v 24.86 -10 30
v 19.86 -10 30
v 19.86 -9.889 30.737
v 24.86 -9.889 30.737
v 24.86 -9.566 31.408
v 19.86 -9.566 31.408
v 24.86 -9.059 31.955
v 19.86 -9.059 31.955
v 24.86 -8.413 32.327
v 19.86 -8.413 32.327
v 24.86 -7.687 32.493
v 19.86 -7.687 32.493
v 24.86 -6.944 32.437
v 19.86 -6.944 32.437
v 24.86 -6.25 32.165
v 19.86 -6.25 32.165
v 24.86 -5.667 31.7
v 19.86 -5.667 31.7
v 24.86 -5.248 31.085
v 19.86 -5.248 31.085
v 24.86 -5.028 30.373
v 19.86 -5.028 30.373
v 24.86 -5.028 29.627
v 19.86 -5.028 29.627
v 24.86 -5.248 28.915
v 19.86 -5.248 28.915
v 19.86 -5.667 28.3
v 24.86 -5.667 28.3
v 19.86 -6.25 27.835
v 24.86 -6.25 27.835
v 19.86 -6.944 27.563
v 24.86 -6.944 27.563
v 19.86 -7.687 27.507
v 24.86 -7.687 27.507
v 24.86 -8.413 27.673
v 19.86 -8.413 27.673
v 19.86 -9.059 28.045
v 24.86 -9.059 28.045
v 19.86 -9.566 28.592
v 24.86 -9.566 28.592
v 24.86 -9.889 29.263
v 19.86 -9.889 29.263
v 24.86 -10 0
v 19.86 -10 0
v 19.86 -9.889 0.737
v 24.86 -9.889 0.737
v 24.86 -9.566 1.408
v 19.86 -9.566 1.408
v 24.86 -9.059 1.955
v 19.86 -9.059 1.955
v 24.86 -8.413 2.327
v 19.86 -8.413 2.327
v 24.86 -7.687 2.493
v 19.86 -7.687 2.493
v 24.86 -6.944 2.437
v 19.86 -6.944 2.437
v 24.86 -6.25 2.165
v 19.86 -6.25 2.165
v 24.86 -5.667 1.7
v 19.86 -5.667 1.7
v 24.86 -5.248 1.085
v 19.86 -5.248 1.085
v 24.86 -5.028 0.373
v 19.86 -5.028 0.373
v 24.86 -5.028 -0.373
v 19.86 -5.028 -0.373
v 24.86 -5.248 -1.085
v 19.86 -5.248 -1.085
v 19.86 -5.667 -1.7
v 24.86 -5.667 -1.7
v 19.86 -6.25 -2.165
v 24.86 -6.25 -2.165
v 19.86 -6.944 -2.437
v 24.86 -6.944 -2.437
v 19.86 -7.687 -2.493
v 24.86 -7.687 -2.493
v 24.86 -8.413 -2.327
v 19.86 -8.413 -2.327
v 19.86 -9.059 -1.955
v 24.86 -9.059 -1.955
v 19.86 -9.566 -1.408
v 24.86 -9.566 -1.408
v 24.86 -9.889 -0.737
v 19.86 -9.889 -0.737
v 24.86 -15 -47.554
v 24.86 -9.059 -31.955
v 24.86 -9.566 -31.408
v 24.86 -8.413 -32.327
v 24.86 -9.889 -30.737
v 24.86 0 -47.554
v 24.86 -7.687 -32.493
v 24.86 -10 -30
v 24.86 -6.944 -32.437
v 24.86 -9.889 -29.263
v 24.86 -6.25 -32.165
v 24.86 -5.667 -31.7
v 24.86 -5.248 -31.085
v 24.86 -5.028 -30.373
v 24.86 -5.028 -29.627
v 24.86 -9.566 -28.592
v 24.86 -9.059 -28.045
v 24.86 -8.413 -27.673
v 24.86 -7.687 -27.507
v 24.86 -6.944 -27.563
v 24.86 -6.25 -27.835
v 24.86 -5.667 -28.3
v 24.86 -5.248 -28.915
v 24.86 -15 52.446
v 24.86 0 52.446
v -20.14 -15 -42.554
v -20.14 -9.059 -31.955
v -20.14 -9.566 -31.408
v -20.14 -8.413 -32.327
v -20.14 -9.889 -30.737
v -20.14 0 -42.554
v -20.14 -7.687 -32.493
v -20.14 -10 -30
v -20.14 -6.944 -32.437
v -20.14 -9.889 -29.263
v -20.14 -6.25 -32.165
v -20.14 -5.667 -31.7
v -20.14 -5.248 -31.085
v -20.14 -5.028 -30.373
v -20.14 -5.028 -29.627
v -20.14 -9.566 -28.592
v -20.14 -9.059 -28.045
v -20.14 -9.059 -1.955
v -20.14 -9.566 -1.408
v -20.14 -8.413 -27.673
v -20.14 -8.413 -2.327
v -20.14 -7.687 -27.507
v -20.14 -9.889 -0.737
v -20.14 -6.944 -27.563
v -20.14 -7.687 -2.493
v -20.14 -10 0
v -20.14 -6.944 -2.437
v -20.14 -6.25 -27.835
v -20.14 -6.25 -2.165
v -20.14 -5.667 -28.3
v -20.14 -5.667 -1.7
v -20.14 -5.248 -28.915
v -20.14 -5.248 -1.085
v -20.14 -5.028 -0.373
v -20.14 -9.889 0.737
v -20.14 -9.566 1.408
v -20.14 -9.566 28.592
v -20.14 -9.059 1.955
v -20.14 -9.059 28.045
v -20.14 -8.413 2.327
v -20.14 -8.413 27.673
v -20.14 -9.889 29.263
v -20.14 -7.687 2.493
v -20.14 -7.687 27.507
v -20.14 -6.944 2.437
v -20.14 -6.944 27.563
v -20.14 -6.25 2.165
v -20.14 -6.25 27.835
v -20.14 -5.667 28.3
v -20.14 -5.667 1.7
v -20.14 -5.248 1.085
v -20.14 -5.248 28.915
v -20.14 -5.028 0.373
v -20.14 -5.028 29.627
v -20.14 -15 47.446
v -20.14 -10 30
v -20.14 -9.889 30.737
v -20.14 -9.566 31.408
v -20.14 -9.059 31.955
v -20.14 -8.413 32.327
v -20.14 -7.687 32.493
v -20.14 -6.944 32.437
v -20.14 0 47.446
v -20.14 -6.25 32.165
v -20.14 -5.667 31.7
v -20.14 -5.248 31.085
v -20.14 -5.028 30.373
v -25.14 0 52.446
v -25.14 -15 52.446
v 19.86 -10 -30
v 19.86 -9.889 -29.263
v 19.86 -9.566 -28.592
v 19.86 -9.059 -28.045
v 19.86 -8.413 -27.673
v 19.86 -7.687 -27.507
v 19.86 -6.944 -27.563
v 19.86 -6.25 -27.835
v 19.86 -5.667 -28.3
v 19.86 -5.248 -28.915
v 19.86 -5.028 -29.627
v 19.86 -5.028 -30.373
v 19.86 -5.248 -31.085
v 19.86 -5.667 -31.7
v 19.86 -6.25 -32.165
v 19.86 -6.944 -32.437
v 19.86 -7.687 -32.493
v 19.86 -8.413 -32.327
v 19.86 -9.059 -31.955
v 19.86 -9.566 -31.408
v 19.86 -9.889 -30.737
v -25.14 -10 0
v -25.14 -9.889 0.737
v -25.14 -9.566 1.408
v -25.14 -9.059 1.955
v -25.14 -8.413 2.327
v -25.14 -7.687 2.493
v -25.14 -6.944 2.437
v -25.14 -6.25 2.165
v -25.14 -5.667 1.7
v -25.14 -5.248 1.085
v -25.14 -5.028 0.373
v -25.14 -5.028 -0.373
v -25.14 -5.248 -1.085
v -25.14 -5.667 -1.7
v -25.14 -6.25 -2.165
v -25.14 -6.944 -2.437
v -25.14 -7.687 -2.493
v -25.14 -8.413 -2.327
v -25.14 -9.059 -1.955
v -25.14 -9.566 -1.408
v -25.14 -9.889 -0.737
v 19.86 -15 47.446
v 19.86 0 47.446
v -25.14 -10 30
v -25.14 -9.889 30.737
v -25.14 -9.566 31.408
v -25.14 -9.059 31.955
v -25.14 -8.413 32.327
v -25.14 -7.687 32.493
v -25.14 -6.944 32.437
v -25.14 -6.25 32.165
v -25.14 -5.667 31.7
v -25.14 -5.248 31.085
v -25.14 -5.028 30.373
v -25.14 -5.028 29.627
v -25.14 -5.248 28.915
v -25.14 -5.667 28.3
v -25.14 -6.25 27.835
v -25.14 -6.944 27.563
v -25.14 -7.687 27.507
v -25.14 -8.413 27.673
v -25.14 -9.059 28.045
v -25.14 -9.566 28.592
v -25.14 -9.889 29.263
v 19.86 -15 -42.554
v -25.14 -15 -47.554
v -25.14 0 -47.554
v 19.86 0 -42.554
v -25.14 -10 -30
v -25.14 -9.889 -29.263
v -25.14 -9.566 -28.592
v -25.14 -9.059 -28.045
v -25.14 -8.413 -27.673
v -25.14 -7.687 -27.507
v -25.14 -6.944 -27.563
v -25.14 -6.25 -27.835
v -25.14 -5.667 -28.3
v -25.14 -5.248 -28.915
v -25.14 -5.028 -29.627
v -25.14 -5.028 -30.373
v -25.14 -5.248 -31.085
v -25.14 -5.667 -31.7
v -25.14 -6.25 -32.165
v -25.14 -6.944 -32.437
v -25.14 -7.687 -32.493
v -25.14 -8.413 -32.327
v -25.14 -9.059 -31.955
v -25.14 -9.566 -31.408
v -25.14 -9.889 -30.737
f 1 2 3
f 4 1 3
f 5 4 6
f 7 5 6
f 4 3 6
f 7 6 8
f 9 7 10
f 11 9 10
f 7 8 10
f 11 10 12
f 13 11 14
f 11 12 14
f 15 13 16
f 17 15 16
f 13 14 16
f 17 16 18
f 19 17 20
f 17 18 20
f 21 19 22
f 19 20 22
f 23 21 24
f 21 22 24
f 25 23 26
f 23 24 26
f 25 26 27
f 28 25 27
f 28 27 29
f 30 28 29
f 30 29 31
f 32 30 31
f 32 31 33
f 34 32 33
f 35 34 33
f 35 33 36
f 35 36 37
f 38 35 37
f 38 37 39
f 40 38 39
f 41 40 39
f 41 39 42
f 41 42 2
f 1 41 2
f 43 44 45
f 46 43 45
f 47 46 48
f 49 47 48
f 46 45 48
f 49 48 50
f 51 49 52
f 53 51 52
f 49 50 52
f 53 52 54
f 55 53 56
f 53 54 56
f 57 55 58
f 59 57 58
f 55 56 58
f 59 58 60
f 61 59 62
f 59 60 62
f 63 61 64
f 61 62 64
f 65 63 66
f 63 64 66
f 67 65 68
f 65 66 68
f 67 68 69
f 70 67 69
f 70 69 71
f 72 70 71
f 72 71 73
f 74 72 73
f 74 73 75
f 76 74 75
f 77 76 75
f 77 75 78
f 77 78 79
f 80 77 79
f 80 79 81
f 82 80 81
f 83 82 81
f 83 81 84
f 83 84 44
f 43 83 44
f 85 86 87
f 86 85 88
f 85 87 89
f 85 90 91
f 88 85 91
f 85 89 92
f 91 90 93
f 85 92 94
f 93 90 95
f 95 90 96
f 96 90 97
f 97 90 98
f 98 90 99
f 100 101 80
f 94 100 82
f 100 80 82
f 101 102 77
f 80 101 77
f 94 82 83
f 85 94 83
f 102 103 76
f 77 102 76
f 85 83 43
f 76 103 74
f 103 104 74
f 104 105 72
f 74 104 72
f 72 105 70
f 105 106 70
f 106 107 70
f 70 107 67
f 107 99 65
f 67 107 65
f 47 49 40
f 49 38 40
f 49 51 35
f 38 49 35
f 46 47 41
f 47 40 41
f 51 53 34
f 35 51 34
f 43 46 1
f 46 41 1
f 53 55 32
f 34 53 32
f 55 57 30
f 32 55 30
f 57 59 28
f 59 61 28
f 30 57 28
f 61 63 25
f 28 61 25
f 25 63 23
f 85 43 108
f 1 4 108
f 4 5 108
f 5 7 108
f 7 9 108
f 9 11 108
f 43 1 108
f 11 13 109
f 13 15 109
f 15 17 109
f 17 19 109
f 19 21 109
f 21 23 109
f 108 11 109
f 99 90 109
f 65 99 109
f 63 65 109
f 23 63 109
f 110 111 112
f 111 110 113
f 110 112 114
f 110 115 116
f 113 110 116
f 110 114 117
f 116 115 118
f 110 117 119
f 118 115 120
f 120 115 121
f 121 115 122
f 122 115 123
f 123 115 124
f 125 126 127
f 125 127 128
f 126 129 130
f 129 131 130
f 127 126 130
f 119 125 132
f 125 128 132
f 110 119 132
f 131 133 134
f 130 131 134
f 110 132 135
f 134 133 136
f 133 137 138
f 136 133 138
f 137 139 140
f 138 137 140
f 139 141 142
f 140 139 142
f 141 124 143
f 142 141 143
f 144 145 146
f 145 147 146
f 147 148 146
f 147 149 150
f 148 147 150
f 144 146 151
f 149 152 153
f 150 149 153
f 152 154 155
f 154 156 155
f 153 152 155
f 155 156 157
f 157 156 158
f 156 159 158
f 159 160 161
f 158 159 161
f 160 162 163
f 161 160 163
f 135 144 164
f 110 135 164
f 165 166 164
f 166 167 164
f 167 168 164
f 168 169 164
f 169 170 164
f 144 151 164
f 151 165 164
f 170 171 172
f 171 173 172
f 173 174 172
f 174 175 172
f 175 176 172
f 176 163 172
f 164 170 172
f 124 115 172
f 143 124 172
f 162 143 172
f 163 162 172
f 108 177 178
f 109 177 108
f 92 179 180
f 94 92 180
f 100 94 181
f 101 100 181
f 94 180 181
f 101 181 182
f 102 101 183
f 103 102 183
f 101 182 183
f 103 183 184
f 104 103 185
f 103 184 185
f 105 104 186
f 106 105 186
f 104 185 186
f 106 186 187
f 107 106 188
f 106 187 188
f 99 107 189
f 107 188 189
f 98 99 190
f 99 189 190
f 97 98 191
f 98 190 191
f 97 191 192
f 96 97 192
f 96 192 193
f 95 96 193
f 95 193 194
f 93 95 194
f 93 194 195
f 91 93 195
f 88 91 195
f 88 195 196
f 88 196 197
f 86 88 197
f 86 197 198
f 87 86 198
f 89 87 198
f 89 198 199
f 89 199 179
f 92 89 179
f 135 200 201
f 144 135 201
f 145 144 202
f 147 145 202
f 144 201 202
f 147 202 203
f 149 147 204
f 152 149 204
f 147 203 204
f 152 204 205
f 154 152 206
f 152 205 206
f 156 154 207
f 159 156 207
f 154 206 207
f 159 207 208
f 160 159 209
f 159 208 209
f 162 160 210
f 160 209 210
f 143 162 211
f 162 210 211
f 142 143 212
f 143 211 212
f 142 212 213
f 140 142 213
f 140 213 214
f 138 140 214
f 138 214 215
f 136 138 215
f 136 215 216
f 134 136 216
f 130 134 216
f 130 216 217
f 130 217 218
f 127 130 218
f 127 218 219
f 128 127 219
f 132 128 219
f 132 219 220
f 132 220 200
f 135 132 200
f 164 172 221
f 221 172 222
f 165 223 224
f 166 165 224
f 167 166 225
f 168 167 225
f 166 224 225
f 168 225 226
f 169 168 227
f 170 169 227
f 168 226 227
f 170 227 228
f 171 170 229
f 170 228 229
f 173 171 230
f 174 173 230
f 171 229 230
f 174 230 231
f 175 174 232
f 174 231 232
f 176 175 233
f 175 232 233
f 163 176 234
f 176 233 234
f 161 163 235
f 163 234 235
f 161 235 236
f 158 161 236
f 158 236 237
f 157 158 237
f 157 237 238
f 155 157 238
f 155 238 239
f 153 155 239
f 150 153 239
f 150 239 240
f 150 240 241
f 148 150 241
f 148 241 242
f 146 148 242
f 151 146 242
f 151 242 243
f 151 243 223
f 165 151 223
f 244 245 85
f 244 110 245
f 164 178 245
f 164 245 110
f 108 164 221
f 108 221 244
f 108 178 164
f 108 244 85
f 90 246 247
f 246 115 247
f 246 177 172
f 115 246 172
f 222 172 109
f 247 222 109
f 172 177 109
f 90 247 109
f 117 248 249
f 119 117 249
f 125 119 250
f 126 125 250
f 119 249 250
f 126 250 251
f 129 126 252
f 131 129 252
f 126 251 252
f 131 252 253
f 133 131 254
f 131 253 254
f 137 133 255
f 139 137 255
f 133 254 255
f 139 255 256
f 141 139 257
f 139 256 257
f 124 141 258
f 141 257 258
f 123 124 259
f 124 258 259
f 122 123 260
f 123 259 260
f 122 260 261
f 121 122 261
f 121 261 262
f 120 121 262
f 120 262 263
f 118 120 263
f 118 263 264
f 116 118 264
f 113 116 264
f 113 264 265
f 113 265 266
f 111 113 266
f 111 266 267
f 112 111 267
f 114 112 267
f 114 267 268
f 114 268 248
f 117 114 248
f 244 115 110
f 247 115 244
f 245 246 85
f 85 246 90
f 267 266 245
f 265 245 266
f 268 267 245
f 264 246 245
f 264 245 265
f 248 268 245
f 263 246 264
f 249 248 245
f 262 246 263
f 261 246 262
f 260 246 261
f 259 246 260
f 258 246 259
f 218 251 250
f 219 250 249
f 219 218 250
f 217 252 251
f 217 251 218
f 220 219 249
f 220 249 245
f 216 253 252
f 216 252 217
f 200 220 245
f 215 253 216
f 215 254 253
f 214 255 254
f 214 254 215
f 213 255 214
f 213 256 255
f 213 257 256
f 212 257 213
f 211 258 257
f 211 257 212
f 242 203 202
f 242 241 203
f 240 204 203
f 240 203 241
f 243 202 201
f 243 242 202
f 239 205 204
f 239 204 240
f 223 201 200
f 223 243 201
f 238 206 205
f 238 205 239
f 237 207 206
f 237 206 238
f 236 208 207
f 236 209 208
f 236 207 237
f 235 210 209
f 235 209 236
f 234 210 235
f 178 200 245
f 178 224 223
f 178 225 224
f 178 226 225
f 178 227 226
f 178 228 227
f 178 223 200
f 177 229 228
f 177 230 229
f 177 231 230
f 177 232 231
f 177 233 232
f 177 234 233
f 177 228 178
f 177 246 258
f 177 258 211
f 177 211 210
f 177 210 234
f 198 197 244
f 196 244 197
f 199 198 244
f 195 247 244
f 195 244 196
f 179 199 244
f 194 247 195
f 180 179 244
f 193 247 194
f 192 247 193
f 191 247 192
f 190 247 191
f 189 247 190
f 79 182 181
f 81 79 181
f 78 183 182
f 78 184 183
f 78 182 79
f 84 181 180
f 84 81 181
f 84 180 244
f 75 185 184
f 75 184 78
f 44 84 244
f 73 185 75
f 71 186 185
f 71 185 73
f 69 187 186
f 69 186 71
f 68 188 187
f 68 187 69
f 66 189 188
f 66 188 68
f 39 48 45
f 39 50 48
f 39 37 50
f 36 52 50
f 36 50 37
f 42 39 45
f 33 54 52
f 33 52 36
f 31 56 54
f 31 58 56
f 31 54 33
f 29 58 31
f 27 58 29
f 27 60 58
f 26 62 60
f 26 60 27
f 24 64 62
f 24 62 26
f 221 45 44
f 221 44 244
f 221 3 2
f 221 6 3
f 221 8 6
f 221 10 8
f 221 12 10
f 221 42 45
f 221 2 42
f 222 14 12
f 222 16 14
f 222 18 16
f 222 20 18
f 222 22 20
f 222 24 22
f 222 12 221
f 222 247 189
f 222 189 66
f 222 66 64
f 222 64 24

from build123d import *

# Parameters (mm, degrees)
F0_W     = 50
F0_H     = 100
F0_W_2   = 40
F0_H_2   = 90
F1_DEPTH = 15
F2_R     = 2.5
F3_DEPTH = 50.001


with BuildPart() as f1:
    # F0 (on Front) → F1 (new body)
    with BuildSketch(Plane.XZ):
        with Locations((-0.139878, 2.446302)):
            Rectangle(F0_W, F0_H)
        with Locations((-0.139878, 2.446302)):
            Rectangle(F0_W_2, F0_H_2, mode=Mode.SUBTRACT)
    extrude(amount=F1_DEPTH)

    # F2 (on face) → F3 (cut, through all)
    with BuildSketch(Plane(origin=(-25.139878, 0, 0), x_dir=(0, -1, 0), z_dir=(-1, 0, 0))):
        with Locations((7.5, 30)):
            Circle(F2_R)
        with Locations((7.5, 0)):
            Circle(F2_R)
        with Locations((7.5, -30)):
            Circle(F2_R)
    extrude(amount=-F3_DEPTH, mode=Mode.SUBTRACT)


solid = f1.part
